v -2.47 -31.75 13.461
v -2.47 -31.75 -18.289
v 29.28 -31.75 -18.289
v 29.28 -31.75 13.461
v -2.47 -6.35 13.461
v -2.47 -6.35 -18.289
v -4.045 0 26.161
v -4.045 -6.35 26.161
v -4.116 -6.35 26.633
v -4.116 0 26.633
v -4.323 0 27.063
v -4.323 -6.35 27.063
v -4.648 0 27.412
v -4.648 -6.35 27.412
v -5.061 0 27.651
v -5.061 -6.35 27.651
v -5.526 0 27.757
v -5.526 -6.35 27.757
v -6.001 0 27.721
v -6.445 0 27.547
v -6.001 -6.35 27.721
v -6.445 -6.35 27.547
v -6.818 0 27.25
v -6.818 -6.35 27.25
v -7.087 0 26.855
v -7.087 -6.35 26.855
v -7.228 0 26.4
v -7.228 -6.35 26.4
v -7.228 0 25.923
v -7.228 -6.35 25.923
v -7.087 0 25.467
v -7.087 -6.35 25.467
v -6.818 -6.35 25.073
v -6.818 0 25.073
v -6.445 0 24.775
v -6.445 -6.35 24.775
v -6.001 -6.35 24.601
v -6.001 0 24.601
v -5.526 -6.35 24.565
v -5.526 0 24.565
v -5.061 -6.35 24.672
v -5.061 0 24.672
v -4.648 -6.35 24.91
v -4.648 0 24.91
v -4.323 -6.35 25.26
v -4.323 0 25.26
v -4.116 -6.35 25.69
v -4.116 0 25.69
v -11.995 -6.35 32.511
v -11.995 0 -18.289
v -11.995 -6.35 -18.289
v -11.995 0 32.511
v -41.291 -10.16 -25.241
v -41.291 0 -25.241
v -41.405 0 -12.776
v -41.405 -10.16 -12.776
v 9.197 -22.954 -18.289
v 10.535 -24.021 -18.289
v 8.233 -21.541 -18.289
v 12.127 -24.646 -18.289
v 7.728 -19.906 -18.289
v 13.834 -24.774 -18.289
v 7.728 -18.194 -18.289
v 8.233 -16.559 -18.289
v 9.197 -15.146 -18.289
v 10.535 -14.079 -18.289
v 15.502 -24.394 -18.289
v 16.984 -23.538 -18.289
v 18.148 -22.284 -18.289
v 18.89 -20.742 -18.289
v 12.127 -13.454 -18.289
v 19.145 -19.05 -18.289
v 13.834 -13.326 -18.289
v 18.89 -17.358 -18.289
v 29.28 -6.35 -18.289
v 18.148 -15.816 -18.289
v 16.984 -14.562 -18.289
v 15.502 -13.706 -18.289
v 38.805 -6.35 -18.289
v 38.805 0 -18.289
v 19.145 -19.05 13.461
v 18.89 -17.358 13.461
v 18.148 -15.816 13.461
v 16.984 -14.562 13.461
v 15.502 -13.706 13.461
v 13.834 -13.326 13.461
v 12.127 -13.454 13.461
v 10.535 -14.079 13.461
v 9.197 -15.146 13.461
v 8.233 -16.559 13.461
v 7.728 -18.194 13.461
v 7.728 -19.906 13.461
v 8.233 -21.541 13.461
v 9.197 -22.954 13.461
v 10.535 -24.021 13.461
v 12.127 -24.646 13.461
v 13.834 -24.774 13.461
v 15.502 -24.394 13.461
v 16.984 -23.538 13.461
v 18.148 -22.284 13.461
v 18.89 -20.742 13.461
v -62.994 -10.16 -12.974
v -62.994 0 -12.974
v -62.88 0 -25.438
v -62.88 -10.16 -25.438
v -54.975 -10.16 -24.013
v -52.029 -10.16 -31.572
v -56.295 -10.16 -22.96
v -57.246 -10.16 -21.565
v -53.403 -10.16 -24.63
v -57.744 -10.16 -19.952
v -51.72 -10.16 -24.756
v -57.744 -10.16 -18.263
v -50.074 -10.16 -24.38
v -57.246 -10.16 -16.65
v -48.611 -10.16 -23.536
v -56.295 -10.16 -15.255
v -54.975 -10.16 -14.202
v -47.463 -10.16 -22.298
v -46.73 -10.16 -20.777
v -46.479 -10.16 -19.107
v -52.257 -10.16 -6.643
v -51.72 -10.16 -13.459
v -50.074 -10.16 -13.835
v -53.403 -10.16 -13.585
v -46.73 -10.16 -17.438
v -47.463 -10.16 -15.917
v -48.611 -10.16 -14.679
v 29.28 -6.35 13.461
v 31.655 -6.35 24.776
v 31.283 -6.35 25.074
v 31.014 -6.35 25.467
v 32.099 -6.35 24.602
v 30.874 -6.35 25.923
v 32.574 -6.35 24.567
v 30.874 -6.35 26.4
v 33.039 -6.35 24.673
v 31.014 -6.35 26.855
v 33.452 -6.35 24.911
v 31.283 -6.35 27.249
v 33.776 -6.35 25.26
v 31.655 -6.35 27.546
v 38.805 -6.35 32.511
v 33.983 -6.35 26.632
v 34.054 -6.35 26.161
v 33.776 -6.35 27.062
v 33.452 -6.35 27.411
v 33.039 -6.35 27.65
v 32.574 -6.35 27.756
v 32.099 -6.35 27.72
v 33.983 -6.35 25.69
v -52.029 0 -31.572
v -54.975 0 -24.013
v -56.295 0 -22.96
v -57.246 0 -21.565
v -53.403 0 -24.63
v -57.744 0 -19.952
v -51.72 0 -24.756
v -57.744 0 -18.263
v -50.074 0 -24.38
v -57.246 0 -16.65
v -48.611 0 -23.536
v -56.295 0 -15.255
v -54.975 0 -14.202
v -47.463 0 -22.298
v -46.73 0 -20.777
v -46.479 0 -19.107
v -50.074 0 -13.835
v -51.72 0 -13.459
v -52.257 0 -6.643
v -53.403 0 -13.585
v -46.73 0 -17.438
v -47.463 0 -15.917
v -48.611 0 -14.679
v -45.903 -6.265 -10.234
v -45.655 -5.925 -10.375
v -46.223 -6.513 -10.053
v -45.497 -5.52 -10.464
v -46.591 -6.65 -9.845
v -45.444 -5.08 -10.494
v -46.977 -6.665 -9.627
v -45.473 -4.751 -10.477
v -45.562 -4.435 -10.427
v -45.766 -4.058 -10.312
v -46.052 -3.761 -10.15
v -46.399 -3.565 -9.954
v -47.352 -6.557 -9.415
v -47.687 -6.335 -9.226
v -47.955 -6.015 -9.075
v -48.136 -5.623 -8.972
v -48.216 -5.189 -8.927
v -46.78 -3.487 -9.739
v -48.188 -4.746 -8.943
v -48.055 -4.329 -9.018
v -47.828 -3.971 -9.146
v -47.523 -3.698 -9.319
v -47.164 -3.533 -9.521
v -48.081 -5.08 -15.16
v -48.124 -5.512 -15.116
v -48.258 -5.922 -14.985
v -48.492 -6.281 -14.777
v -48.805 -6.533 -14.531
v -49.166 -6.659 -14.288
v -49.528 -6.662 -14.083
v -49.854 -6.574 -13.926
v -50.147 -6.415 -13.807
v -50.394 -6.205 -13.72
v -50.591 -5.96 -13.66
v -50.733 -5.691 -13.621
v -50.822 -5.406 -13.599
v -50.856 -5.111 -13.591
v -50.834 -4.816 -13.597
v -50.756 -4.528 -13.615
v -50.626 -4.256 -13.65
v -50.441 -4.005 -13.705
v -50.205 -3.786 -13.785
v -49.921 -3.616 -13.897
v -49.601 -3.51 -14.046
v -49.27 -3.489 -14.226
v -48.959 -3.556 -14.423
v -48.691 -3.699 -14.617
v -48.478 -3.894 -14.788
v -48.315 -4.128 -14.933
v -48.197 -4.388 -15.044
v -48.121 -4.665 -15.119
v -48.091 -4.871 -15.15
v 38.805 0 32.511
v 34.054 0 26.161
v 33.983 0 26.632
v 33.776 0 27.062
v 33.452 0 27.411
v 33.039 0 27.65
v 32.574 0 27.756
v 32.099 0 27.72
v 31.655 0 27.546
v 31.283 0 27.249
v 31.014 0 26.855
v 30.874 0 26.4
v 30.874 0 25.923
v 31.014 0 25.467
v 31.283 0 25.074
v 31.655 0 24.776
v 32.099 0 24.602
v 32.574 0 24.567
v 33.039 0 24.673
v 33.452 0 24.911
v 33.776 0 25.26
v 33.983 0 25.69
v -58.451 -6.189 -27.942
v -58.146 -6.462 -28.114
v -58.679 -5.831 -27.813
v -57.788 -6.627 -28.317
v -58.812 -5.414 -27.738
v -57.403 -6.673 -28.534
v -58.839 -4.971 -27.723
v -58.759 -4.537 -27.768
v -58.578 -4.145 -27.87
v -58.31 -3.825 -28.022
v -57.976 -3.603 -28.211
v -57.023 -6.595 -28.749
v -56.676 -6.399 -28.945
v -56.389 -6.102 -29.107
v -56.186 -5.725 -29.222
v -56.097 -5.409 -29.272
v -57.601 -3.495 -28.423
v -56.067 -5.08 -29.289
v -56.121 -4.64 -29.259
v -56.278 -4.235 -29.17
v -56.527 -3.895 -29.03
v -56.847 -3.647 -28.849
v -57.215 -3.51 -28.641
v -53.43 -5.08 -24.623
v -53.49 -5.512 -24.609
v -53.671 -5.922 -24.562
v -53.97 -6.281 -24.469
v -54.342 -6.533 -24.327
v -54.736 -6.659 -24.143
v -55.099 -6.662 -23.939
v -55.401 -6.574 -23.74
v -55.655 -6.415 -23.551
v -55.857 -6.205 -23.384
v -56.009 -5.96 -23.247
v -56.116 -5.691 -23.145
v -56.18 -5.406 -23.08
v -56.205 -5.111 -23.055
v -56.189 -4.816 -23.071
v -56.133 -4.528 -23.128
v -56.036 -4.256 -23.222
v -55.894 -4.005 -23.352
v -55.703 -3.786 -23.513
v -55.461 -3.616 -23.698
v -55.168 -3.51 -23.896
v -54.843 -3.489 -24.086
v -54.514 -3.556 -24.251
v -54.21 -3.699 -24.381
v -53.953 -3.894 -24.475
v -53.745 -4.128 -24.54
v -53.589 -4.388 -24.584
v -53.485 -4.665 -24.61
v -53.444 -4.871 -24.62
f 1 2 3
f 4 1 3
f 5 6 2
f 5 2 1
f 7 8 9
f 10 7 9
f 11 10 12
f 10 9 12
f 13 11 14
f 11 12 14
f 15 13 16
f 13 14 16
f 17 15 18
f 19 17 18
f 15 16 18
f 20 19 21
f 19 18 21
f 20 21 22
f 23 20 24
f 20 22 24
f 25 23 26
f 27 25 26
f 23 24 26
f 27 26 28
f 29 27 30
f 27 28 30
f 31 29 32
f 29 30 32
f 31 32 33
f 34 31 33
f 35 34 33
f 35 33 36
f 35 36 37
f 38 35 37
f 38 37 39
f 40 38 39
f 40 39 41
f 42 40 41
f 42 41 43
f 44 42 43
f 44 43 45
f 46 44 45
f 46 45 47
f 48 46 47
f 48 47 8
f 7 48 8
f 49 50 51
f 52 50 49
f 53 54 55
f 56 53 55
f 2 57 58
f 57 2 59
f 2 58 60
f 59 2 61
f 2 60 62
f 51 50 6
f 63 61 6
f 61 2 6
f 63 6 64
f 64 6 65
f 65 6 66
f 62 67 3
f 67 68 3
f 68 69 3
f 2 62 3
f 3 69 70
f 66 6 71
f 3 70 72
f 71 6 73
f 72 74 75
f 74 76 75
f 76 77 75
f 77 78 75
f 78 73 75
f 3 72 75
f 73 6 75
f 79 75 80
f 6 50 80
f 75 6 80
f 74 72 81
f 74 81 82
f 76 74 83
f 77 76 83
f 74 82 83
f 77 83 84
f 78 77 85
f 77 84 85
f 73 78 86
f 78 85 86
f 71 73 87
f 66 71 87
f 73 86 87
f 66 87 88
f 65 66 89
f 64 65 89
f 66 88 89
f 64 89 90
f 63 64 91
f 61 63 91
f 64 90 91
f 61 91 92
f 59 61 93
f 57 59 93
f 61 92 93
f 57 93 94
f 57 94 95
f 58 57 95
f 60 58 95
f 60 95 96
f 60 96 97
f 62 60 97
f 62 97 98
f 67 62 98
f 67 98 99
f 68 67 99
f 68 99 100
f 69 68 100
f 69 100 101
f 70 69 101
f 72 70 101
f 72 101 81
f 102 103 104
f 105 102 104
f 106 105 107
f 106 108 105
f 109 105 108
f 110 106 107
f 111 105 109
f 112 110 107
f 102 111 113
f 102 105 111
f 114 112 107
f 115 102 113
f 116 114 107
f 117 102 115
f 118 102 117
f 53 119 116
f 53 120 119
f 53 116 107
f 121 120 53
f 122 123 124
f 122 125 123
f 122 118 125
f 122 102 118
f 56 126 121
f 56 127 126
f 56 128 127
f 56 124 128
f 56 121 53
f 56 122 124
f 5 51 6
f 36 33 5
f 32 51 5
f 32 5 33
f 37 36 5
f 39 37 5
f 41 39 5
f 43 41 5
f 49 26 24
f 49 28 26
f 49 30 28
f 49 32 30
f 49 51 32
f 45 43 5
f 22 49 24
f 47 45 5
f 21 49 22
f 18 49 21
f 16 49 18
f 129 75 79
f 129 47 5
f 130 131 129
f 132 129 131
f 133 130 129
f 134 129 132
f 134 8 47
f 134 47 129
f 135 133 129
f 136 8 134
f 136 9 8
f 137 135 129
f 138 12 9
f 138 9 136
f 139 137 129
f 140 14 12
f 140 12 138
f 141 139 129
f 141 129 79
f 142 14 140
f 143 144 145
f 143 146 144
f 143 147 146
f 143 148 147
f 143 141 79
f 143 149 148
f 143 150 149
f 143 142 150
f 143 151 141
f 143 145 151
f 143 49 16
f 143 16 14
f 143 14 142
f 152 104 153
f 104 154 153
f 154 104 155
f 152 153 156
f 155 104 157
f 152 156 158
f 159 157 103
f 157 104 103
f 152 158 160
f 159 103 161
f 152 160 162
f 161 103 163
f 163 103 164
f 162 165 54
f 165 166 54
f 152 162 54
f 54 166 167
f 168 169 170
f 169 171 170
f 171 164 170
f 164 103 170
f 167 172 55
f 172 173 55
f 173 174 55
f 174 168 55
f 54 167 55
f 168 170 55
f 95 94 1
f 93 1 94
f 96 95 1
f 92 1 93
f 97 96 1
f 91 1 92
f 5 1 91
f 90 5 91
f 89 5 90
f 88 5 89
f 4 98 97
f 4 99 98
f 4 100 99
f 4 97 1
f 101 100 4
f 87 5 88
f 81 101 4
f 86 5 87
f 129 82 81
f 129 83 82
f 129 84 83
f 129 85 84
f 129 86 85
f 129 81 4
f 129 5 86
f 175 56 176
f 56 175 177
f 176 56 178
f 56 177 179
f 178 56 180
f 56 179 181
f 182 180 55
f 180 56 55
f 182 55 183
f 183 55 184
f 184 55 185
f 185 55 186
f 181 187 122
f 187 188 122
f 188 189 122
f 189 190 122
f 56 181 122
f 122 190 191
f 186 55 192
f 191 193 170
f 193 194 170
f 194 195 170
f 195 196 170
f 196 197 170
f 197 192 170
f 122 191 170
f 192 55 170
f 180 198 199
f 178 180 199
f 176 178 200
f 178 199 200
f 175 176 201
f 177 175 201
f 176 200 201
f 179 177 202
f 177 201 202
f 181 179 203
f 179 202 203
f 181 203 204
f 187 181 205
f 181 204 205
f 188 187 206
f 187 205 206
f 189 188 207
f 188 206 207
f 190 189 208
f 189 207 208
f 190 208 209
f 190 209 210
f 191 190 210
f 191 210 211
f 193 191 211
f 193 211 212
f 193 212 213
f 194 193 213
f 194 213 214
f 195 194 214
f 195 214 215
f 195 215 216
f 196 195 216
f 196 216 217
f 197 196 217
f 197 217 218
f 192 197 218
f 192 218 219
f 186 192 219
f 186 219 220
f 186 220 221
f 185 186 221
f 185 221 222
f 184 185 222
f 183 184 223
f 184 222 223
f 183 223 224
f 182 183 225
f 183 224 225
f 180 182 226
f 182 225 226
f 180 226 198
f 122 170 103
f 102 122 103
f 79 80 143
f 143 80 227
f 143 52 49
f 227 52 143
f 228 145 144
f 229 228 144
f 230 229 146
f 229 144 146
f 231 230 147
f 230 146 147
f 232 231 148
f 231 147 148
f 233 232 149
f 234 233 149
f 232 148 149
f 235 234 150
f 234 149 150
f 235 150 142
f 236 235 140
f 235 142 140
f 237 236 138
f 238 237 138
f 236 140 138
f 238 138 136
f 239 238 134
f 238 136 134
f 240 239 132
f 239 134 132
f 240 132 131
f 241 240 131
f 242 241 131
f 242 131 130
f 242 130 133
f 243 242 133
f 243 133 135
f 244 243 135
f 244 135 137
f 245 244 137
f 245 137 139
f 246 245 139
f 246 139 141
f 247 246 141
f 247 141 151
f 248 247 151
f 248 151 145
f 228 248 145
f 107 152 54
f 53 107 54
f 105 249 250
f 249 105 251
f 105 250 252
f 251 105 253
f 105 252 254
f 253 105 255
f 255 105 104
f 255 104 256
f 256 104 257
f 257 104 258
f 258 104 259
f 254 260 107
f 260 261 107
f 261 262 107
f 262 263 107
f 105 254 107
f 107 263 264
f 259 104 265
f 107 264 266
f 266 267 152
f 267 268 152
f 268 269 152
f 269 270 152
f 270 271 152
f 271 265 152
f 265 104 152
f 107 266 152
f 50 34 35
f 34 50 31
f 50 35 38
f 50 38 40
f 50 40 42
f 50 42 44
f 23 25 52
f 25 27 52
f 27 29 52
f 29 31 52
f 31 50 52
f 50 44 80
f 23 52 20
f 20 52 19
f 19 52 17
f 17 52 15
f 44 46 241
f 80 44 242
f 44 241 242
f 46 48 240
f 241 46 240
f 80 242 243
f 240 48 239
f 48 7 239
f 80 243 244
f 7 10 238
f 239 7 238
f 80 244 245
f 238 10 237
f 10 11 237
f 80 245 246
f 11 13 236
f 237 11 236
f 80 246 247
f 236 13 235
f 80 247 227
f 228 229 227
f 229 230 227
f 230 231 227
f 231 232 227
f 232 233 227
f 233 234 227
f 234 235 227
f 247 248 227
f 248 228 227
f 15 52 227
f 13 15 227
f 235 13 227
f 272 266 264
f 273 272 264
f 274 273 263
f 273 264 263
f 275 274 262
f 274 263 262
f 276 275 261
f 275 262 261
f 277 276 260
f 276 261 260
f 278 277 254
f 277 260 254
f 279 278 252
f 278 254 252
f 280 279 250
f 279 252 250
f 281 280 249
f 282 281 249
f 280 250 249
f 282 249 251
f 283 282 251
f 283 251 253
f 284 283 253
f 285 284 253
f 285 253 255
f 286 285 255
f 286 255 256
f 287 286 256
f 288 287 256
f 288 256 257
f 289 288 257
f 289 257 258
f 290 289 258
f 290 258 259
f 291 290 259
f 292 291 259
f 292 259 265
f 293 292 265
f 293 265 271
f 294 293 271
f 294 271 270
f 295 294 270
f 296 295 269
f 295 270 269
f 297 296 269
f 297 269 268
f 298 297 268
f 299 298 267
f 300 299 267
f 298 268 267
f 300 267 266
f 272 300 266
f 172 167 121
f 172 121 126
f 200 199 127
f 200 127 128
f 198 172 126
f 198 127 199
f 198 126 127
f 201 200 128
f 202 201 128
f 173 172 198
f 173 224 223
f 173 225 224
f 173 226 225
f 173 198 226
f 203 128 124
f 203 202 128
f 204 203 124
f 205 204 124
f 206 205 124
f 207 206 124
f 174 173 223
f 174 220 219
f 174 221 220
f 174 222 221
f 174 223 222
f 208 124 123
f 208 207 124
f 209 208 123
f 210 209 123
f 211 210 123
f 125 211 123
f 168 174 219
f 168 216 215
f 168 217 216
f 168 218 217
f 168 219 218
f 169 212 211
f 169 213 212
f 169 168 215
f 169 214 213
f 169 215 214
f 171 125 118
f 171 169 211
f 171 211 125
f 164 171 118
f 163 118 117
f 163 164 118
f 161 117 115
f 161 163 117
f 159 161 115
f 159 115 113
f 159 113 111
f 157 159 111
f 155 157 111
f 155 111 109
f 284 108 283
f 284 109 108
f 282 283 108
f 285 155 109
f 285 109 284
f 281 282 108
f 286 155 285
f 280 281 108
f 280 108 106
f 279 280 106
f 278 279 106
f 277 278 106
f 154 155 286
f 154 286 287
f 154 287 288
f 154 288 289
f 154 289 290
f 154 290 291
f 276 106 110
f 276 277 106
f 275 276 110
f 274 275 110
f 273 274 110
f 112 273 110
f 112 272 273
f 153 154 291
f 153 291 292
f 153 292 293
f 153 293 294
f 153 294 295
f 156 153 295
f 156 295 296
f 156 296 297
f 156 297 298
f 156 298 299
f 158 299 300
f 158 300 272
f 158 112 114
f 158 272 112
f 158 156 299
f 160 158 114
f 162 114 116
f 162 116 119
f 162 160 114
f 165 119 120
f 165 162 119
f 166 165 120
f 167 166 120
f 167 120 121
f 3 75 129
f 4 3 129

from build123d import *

# Parameters (mm, degrees)
F0_W      = 50.8
F0_H      = 50.8
F1_DEPTH  = 6.35
F2_W      = 31.75
F2_H      = 31.75
F3_DEPTH  = 25.4
F4_R      = 5.7404
F5_DEPTH  = 33.02
F6_R      = 1.6002
F6_R_2    = 1.59893
F7_DEPTH  = 6.604
F8_R      = 5.6642
F9_DEPTH  = 10.16
F10_R     = 1.593949
F11_DEPTH = 22.86


with BuildPart() as f1:
    # F0 (on Front) → F1 (new body)
    with BuildSketch(Plane.XZ):
        with Locations((13.40475, 7.111192)):
            Rectangle(F0_W, F0_H)
    extrude(amount=F1_DEPTH)

    # F2 (on face) → F3 (join)
    with BuildSketch(Plane.XZ.offset(6.35)):
        with Locations((13.40475, -2.413808)):
            Rectangle(F2_W, F2_H)
    extrude(amount=F3_DEPTH)

    # F4 (on face) → F5 (cut)
    with BuildSketch(Plane.XY.offset(13.461192)):
        with Locations((13.40475, -19.05)):
            Circle(F4_R)
    extrude(amount=-F5_DEPTH, mode=Mode.SUBTRACT)

    # F6 (on face) → F7 (cut)
    with BuildSketch(Plane.XZ.offset(6.35)):
        with Locations((-5.64525, 26.161192)):
            Circle(F6_R)
        with Locations((32.45475, 26.161192)):
            Circle(F6_R_2)
    extrude(amount=-F7_DEPTH, mode=Mode.SUBTRACT)


with BuildPart() as f9:
    # F8 (on Front) → F9 (new body)
    with BuildSketch(Plane.XZ):
        Polygon((-41.405362, -12.776376), (-52.256921, -6.642886), (-62.994458, -12.973866), (-62.880437, -25.438337), (-52.028878, -31.571827), (-41.291341, -25.240847), align=None)
        with Locations((-52.142899, -19.107357)):
            Circle(F8_R, mode=Mode.SUBTRACT)
    extrude(amount=F9_DEPTH)

    # F10 (on face) → F11 (cut)
    with BuildSketch(Plane(origin=(-26.121574, 0, -46.215088), x_dir=(0.870563, 0, -0.492057), z_dir=(-0.492057, 0, -0.870563))):
        with Locations((-35.991756, 5.08)):
            Circle(F10_R)
    extrude(amount=-F11_DEPTH, mode=Mode.SUBTRACT)


solid = Compound([f1.part, f9.part])
